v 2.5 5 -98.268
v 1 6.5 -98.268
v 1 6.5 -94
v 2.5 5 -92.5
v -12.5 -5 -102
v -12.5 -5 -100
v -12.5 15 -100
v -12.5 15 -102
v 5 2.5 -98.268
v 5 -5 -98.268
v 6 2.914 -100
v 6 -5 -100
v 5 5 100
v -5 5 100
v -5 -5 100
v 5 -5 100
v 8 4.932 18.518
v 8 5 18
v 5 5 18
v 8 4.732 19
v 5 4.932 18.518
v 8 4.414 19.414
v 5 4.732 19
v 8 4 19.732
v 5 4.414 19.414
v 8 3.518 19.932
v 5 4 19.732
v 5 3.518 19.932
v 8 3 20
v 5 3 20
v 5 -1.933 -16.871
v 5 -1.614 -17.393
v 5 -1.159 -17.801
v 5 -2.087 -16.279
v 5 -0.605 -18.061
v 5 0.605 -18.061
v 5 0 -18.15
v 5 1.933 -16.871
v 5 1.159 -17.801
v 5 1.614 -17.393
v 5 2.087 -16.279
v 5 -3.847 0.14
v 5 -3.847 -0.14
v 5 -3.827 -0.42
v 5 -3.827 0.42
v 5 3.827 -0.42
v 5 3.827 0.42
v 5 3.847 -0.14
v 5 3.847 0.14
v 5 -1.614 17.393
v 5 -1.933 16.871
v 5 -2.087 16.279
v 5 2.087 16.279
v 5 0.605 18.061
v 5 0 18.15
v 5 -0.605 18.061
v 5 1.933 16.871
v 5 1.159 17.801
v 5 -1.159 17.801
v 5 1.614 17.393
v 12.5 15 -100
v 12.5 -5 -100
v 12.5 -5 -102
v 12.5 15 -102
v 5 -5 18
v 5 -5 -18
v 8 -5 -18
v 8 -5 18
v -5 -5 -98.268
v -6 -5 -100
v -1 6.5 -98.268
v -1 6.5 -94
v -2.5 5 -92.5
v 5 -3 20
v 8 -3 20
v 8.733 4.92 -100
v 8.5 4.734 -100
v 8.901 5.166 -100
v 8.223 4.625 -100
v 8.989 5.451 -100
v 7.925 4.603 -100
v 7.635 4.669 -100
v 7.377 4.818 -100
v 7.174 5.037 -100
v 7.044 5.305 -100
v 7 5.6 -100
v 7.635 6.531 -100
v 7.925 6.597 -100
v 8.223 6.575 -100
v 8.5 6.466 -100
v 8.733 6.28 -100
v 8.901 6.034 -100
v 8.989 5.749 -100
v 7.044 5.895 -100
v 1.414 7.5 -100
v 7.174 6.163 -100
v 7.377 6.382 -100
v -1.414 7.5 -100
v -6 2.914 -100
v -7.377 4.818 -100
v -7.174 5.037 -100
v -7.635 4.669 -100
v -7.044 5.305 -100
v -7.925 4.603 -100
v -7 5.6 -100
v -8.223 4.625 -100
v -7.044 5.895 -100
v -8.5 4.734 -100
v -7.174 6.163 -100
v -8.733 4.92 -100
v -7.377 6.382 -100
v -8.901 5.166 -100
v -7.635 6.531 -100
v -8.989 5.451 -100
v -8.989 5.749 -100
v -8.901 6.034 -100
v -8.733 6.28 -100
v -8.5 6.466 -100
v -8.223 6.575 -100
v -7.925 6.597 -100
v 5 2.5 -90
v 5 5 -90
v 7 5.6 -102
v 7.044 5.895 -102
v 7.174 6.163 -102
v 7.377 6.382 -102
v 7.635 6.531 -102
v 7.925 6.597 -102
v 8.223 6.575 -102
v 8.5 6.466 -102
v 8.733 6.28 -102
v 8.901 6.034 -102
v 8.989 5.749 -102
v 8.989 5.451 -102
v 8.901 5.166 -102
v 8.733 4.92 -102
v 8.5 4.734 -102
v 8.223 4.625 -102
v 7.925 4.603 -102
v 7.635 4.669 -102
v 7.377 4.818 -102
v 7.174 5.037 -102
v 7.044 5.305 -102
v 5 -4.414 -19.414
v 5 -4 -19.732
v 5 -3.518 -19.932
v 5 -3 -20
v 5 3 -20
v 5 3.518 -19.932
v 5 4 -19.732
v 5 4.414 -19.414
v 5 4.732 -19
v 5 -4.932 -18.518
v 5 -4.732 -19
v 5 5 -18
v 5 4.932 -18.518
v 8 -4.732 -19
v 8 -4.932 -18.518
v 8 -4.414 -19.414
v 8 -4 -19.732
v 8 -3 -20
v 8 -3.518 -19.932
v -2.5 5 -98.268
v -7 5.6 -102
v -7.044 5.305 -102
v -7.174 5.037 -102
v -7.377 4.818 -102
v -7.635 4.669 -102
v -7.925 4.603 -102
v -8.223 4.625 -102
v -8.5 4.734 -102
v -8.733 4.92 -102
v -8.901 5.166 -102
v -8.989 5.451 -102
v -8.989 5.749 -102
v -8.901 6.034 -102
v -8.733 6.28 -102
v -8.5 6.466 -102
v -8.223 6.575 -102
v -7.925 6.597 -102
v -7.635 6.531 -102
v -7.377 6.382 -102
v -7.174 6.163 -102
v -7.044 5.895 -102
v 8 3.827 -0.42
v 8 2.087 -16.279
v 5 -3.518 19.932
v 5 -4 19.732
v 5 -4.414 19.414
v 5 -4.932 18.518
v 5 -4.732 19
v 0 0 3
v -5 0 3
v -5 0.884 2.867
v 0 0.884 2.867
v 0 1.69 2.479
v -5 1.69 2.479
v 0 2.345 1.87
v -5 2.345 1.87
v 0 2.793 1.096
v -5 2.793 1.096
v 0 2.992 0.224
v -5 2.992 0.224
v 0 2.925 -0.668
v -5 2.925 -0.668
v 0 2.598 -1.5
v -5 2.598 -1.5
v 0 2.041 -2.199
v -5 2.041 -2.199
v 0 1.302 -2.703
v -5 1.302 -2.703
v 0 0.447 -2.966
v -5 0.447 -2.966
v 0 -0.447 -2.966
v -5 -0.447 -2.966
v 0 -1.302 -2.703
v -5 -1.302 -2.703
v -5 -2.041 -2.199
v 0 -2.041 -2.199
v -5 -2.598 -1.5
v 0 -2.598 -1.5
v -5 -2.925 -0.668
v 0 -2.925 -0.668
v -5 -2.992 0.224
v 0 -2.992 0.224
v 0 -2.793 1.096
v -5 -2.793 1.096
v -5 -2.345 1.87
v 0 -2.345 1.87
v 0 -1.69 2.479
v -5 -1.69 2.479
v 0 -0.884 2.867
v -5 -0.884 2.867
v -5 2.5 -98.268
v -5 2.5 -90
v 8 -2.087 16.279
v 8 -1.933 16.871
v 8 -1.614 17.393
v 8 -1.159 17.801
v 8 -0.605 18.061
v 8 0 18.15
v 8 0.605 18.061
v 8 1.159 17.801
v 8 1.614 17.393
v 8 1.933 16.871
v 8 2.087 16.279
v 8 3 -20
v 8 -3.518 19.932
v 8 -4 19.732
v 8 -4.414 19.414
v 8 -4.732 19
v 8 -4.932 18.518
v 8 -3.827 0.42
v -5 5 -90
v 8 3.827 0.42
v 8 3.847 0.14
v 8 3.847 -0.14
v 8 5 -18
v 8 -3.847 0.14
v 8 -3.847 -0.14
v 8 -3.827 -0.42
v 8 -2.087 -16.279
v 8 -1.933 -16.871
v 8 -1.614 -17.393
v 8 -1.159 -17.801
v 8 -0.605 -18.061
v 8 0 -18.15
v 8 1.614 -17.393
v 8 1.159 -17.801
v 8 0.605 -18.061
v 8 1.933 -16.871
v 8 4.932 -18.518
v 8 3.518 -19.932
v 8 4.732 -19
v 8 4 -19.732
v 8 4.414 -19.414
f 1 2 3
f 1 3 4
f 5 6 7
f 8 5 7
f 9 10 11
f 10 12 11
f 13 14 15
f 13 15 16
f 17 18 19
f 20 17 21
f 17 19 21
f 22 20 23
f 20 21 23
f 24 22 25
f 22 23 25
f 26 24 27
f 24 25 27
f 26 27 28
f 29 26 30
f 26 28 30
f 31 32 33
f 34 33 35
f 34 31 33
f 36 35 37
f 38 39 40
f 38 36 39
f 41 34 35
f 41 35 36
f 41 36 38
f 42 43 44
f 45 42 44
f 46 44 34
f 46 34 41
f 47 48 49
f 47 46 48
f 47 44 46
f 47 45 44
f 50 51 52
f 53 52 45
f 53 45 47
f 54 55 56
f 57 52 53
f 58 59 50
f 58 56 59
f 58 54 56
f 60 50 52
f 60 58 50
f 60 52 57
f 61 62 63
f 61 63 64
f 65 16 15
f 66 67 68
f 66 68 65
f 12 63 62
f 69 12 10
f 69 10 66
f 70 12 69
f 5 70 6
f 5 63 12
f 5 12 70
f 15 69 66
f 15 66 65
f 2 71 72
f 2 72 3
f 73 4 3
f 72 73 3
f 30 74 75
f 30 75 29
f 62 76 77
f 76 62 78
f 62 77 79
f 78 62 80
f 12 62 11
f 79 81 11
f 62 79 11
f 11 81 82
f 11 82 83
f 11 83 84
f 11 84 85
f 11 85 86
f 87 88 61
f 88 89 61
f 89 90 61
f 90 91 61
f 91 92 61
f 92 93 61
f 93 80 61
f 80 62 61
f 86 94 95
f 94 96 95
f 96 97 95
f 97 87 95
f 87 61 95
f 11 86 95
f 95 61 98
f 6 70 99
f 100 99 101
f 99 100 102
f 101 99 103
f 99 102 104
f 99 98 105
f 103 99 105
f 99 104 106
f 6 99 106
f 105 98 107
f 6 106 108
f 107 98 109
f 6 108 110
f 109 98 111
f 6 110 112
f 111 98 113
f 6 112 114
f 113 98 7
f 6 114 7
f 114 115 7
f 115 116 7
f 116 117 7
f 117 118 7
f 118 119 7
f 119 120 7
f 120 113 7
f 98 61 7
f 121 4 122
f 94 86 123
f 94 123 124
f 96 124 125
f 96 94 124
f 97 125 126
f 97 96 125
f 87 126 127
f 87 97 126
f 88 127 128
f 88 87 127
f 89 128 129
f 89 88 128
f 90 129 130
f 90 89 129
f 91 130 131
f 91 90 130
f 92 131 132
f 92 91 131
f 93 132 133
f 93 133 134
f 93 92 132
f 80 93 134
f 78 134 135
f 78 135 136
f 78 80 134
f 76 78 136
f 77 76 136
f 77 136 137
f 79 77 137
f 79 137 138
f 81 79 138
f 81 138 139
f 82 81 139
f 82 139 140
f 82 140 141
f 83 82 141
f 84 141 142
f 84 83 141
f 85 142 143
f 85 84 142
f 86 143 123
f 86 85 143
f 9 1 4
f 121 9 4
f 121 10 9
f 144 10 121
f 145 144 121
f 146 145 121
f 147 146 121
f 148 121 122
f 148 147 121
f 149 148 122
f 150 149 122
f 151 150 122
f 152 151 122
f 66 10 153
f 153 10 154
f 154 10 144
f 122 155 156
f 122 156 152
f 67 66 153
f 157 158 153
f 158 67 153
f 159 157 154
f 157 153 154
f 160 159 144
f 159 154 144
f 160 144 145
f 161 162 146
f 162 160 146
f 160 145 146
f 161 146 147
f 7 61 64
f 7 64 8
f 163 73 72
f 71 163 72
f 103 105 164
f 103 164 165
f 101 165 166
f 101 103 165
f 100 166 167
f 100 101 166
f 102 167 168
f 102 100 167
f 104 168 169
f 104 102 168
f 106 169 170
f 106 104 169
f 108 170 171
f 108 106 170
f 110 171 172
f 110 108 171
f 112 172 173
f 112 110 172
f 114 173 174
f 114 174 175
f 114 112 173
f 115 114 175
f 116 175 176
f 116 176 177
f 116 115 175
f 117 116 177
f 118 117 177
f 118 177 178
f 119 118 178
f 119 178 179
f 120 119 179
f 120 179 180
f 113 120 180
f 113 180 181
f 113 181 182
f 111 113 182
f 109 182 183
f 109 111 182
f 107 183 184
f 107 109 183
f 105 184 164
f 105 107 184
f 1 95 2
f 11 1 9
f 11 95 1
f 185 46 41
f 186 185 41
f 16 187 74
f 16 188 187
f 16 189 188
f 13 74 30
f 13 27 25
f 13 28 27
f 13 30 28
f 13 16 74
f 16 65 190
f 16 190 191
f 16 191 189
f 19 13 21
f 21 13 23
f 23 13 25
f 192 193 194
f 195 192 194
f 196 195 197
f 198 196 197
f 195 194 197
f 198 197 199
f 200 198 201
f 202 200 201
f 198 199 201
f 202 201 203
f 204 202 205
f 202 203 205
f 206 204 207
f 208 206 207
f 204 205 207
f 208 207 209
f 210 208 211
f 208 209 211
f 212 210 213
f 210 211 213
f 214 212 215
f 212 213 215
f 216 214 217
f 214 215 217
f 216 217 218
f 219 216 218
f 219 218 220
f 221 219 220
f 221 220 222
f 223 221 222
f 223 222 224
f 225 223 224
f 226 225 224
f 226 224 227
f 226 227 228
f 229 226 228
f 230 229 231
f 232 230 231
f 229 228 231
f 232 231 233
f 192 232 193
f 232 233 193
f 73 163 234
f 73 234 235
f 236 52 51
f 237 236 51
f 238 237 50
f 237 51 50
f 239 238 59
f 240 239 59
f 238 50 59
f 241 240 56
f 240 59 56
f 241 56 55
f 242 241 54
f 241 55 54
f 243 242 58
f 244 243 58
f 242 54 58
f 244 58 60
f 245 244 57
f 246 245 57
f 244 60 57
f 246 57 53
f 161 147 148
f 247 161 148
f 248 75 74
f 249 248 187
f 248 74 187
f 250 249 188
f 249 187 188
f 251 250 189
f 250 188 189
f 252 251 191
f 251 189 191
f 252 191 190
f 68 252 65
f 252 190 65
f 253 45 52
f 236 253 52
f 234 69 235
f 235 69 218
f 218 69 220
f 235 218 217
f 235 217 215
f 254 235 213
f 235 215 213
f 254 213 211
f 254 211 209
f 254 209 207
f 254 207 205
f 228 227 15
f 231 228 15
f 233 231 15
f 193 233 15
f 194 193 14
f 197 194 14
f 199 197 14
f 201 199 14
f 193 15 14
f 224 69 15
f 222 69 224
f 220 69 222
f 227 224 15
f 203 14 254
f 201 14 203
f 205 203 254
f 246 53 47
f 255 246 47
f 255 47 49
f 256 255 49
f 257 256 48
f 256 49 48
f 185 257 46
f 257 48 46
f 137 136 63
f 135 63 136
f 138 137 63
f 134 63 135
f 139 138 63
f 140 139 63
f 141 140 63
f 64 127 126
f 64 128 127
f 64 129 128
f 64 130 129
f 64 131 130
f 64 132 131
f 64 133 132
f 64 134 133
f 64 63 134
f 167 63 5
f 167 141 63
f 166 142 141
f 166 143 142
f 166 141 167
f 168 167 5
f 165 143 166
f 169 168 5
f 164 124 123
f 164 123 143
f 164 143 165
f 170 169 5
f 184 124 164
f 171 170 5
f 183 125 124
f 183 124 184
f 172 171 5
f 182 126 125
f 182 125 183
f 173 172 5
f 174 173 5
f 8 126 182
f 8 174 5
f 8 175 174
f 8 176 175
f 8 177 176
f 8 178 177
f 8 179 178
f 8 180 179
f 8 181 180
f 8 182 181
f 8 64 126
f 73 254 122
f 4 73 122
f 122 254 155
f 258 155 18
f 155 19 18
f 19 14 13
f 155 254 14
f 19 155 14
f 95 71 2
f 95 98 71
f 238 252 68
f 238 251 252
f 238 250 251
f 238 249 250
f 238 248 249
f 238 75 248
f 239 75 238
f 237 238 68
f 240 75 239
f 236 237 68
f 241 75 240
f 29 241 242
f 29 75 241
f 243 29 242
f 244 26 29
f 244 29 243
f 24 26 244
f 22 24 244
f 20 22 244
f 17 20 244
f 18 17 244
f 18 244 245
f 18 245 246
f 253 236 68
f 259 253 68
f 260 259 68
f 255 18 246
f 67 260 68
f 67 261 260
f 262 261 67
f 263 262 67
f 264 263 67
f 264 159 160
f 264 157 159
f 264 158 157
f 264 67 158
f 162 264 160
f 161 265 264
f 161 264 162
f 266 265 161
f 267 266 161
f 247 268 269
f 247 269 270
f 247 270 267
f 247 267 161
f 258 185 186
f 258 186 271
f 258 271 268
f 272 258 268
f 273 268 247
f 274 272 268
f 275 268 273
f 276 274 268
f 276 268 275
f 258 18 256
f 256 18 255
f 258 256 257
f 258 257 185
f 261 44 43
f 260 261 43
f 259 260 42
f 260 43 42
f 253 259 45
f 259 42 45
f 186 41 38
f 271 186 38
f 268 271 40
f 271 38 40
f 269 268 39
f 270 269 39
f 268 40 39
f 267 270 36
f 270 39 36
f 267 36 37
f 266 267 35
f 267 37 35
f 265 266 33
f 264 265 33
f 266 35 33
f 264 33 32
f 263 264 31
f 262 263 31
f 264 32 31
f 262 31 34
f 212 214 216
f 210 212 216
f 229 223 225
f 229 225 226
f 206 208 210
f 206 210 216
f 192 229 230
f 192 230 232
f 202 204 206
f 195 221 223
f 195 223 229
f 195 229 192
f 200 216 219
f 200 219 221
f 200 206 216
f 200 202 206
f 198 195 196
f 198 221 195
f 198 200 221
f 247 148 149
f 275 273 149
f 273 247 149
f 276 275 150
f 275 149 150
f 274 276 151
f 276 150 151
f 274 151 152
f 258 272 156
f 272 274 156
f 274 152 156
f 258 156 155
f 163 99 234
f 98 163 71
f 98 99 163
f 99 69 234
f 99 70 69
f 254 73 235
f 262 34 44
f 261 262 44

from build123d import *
from build123d.topology import SkipClean

# Parameters (mm, degrees)
SKETCH1_W           = 10
SKETCH1_H           = 10
BOSS_EXTRUDE1_DEPTH = 100
SKETCH2_W           = 25
SKETCH2_H           = 20
SKETCH2_R           = 1
BOSS_EXTRUDE2_DEPTH = 2
CUT_EXTRUDE2_DEPTH  = 2.5
CHAMFER2_SIZE       = 2.5
BOSS_EXTRUDE3_DEPTH = 7.5
CUT_EXTRUDE3_DEPTH  = 7.5
SKETCH8_W           = 40
SKETCH8_H           = 10
BOSS_EXTRUDE4_DEPTH = 3
FILLET1_R           = 2
SKETCH9_R           = 3
CUT_EXTRUDE4_DEPTH  = 5


with BuildPart() as part:
    # Sketch1 → Boss-Extrude1 (new, symmetric)
    with BuildSketch(Plane.XY):
        Rectangle(SKETCH1_W, SKETCH1_H)
    extrude(amount=BOSS_EXTRUDE1_DEPTH, both=True)

    # Sketch2 → Boss-Extrude2 (add)
    with BuildSketch(Plane(origin=(0, 0, -100), x_dir=(-1, 0, 0), z_dir=(0, 0, -1))):
        with Locations((0, 5)):
            Rectangle(SKETCH2_W, SKETCH2_H)
        with Locations((-8, 5.6)):
            Circle(SKETCH2_R, mode=Mode.SUBTRACT)
        with Locations(Location((8, 5.6, 0), (0, 0, 180))):
            Circle(SKETCH2_R, mode=Mode.SUBTRACT)
    extrude(amount=BOSS_EXTRUDE2_DEPTH)

    # Sketch4 → Cut-Extrude2 (cut)
    with BuildSketch(Plane(origin=(0, 5, 0), x_dir=(1, 0, 0), z_dir=(0, 1, 0))):
        Polygon((5, 100), (2.5, 100), (2.5, 92.5), (5, 90), (5, 92.5), align=None)
        Polygon((-5, 90), (-5, 92.5), (-5, 100), (-2.5, 100), (-2.5, 92.5), align=None)
    extrude(amount=-CUT_EXTRUDE2_DEPTH, mode=Mode.SUBTRACT)

    # Chamfer2
    chamfer2_edges = [part.edges().sort_by_distance(p)[0] for p in [
        (-2.5, 2.5, -96.25),
        (2.5, 2.5, -96.25),
    ]]
    chamfer(chamfer2_edges, length=CHAMFER2_SIZE - 0.0001)  # a hair under: the kernel refuses the full size

    # Sketch5 → Boss-Extrude3 (add)
    with SkipClean():  # the faces are left unmerged after this step: merging them gives an invalid solid
        with BuildSketch(Plane.XY.offset(-100)):
            Polygon((-2.5, 5), (-1, 6.5), (1, 6.5), (2.5, 5), align=None)
        extrude(amount=BOSS_EXTRUDE3_DEPTH)

    # Sketch7 → Cut-Extrude3 (cut)
    with SkipClean():  # the faces are left unmerged after this step: merging them gives an invalid solid
        with BuildSketch(Plane(origin=(5, 0, 0), x_dir=(0, 0, -1), z_dir=(1, 0, 0))):
            Polygon((92.5, 5), (94, 6.5), (92.5, 6.5), align=None)
        extrude(amount=-CUT_EXTRUDE3_DEPTH, mode=Mode.SUBTRACT)

    # Chamfer3: read off the stored shape, not the designer's step
    # Chamfer3: loft between two sections, ruled curve by curve
    with SkipClean():  # the faces are left unmerged after this step: merging them gives an invalid solid
        chamfer3_from = [
            Edge.make_line((-5, -5, -98.267949192), (-5, 2.5, -98.267949192)),
            Edge.make_line((-5, 2.5, -98.267949192), (-1, 6.5, -98.267949192)),
            Edge.make_line((-1, 6.5, -98.267949192), (1, 6.5, -98.267949192)),
            Edge.make_line((1, 6.5, -98.267949192), (5, 2.5, -98.267949192)),
            Edge.make_line((5, -5, -98.267949192), (5, 2.5, -98.267949192)),
            Edge.make_line((5, -5, -98.267949192), (-5, -5, -98.267949192)),
        ]
        chamfer3_to = [
            Edge.make_line((-6, -5, -100), (-6, 2.914213562, -100)),
            Edge.make_line((-6, 2.914213562, -100), (-1.414213562, 7.5, -100)),
            Edge.make_line((-1.414213562, 7.5, -100), (1.414213562, 7.5, -100)),
            Edge.make_line((1.414213562, 7.5, -100), (6, 2.914213562, -100)),
            Edge.make_line((6, -5, -100), (6, 2.914213562, -100)),
            Edge.make_line((6, -5, -100), (-6, -5, -100)),
        ]
        chamfer3 = Solid(Shell([*[Face.make_surface_from_curves(chamfer3_from[k], chamfer3_to[k]) for k in range(6)], Face(Wire(chamfer3_from)), Face(Wire(chamfer3_to))]))
        add(chamfer3)

    # Sketch8 → Boss-Extrude4 (add)
    with SkipClean():  # the faces are left unmerged after this step: merging them gives an invalid solid
        with BuildSketch(Plane(origin=(5, 0, 0), x_dir=(0, 0, -1), z_dir=(1, 0, 0))):
            Rectangle(SKETCH8_W, SKETCH8_H)
            with BuildLine():
                Line((0.419781931, 3.827046267), (16.278971963, 2.087479782))
                ThreePointArc((16.278971963, 2.087479782), (18.15, 0), (16.278971963, -2.087479782))
                Line((16.278971963, -2.087479782), (0.419781931, -3.827046267))
                ThreePointArc((0.419781931, -3.827046267), (0, -3.85), (-0.419781931, -3.827046267))
                Line((-0.419781931, -3.827046267), (-16.278971963, -2.087479782))
                ThreePointArc((-16.278971963, -2.087479782), (-18.15, 0), (-16.278971963, 2.087479782))
                Line((-16.278971963, 2.087479782), (-0.419781931, 3.827046267))
                ThreePointArc((-0.419781931, 3.827046267), (0, 3.85), (0.419781931, 3.827046267))
            make_face(mode=Mode.SUBTRACT)
        extrude(amount=BOSS_EXTRUDE4_DEPTH)

    # Fillet1
    # the kernel refuses this fillet: 2 mm, written as the material it takes off along each edge
    with BuildSketch(Plane(origin=(5, 5, -20), x_dir=(0, -1, 0), z_dir=(1, 0, 0)), Plane(origin=(5, -5, -20), x_dir=(0, 0, 1), z_dir=(1, 0, 0))) as fillet1_piece_1:
        with BuildLine():
            CenterArc((FILLET1_R, -FILLET1_R), FILLET1_R, 90, 90)
            Line((0, -FILLET1_R), (0, 0))
            Line((0, 0), (FILLET1_R, 0))
        make_face()
    extrude(amount=8, mode=Mode.SUBTRACT)
    with BuildSketch(Plane(origin=(5, 5, 20), x_dir=(0, -1, 0), z_dir=(1, 0, 0)), Plane(origin=(5, -5, 20), x_dir=(0, 0, -1), z_dir=(1, 0, 0))) as fillet1_piece_2:
        with BuildLine():
            CenterArc((FILLET1_R, FILLET1_R), FILLET1_R, 180, 90)
            Line((0, FILLET1_R), (0, 0))
            Line((0, 0), (FILLET1_R, 0))
        make_face()
    extrude(amount=8, mode=Mode.SUBTRACT)

    # Sketch9 → Cut-Extrude4 (cut)
    with SkipClean():  # the faces are left unmerged after this step: merging them gives an invalid solid
        with BuildSketch(Plane.ZY.offset(5)):
            Circle(SKETCH9_R)
        extrude(amount=-CUT_EXTRUDE4_DEPTH, mode=Mode.SUBTRACT)


solid = part.part
